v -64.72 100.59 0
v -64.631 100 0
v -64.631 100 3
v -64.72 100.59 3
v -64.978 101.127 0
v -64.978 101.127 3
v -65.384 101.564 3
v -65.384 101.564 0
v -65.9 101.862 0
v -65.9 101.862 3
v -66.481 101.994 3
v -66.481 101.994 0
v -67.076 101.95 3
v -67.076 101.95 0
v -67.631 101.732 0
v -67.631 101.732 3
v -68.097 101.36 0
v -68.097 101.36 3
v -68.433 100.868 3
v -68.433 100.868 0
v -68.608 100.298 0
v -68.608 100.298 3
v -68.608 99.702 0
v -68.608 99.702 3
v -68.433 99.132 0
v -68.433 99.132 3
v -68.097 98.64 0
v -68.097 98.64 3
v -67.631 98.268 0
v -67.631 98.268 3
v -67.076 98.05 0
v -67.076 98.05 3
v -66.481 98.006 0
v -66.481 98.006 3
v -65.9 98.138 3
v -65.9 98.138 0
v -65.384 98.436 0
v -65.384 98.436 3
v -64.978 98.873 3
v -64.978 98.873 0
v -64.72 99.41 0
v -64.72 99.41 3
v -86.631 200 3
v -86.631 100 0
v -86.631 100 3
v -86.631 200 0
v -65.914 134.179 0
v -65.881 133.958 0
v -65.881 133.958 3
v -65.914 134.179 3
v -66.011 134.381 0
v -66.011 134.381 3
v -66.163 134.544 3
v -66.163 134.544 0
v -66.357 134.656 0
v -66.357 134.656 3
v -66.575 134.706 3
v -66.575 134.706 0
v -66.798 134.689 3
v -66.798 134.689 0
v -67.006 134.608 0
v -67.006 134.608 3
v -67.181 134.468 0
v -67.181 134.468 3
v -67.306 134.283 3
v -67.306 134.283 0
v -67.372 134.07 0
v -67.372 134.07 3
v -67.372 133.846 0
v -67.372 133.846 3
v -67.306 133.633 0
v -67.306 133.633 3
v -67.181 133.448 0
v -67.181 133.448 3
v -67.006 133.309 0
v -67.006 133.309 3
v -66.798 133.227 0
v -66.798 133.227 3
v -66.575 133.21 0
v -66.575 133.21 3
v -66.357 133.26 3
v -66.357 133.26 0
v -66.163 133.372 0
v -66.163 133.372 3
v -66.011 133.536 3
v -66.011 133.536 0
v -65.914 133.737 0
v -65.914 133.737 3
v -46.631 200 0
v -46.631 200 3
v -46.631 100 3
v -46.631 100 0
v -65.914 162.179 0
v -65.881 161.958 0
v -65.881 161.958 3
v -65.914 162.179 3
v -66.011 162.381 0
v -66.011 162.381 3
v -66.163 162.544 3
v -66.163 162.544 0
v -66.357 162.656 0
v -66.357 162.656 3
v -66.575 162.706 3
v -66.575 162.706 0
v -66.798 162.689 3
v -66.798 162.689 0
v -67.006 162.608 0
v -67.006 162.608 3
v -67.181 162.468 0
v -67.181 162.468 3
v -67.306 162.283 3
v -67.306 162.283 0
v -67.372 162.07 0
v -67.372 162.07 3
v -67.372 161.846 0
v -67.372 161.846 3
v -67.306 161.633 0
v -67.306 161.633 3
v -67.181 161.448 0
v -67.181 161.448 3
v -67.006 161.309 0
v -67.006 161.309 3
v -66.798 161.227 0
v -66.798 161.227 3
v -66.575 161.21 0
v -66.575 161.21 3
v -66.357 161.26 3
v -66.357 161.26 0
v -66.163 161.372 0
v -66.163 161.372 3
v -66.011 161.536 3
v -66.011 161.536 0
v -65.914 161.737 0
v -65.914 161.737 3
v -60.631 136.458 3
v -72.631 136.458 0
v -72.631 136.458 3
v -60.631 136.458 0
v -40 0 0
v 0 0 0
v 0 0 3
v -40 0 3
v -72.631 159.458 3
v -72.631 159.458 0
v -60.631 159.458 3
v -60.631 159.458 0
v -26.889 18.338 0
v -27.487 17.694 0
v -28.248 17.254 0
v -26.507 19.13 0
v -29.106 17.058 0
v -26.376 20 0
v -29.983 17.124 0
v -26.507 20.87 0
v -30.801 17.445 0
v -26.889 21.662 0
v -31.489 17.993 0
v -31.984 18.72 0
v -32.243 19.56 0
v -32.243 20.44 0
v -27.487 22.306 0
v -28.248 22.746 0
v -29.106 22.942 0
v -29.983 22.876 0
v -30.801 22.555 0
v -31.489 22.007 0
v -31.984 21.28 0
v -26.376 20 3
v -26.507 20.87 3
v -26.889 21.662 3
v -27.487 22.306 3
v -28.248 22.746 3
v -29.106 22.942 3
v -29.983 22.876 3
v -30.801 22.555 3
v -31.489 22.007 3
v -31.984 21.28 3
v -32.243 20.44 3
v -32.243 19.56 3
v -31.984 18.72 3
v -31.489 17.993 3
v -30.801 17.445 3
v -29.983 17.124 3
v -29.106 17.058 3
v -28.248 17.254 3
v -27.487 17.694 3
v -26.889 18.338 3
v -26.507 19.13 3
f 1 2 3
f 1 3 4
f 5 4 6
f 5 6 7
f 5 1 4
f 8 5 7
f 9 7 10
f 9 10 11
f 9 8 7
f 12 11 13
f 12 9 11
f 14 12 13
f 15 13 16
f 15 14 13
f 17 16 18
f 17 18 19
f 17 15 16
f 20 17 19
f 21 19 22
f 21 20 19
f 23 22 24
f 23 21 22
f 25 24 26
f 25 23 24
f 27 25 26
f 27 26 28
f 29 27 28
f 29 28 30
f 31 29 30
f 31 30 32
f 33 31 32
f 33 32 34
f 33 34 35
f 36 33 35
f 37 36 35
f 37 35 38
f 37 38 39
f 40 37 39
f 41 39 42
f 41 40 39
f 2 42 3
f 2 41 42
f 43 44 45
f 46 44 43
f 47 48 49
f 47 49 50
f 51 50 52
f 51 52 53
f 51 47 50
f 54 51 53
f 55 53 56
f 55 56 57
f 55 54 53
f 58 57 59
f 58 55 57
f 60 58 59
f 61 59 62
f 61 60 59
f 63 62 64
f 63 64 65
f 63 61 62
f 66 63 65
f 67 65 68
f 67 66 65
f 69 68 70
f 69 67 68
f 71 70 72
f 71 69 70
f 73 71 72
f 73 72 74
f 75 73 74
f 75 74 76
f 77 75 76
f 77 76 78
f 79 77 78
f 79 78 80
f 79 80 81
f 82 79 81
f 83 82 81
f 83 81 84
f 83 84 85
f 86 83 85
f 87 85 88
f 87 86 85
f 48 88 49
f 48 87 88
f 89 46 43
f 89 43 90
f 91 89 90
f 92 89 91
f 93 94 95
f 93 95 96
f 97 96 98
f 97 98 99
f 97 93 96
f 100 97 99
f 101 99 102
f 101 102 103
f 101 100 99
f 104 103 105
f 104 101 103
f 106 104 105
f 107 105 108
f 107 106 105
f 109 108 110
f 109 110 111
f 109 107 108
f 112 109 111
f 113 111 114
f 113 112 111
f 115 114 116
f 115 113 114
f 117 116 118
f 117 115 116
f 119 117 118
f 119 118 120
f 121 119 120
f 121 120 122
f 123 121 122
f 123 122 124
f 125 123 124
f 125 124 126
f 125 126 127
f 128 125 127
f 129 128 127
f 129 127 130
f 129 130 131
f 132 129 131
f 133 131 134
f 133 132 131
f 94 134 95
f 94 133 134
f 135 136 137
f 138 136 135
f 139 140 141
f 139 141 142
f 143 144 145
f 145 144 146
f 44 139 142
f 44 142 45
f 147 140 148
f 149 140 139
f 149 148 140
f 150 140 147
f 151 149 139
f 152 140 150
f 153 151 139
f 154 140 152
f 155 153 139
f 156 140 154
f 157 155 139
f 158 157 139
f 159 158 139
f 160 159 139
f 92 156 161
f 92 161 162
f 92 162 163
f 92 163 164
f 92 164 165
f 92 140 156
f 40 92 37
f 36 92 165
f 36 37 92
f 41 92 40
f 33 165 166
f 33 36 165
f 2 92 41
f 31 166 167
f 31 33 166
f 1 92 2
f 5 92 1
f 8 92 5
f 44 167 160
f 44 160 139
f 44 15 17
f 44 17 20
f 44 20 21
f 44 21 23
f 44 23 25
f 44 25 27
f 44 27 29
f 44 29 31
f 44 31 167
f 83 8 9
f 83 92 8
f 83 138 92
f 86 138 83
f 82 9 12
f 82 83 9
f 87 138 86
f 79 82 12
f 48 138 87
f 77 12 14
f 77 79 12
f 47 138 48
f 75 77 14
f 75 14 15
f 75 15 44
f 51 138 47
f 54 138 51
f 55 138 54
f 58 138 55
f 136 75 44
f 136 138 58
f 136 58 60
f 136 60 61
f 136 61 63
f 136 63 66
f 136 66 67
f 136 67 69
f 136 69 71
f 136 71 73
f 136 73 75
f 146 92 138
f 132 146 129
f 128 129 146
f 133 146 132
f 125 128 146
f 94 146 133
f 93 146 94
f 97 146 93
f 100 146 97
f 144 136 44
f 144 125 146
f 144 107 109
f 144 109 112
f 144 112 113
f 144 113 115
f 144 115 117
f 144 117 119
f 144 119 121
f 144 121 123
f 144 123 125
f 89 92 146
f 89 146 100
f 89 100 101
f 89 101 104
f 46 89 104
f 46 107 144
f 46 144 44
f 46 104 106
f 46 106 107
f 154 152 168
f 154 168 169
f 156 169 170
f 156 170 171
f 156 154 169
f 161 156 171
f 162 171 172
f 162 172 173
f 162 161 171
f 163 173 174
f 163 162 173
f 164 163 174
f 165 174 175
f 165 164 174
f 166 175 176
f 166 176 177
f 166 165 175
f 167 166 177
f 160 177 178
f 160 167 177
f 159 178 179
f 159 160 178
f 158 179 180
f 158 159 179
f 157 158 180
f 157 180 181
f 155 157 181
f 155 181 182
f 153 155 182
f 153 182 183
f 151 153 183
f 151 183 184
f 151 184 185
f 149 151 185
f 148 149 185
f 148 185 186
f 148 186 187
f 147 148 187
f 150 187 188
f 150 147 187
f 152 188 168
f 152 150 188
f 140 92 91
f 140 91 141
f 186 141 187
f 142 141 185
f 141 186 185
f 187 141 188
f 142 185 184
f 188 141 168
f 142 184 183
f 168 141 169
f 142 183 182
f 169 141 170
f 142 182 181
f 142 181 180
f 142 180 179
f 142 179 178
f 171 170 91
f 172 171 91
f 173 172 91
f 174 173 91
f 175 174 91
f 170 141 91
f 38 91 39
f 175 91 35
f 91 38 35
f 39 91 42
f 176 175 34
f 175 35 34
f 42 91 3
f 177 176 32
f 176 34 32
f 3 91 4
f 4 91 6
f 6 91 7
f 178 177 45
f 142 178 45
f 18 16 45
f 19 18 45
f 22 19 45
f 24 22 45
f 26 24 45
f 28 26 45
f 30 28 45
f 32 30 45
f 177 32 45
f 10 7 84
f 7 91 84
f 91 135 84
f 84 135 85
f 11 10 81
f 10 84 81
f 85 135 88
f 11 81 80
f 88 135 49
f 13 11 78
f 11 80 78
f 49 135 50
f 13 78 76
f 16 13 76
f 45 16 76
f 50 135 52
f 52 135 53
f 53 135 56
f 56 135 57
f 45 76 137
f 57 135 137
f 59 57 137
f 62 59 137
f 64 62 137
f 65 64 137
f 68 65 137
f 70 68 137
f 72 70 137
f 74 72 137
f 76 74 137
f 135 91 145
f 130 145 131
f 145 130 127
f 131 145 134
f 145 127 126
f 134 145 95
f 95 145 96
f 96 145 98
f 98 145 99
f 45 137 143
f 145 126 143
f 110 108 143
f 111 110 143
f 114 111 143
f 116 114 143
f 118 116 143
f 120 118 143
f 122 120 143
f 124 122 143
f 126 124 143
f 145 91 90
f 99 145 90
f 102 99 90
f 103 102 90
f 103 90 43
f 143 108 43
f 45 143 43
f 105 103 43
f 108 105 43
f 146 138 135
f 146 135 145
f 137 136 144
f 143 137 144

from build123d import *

# Parameters (mm, degrees)
CROQUIS1_R              = 2.95
CROQUIS1_R_2            = 0.75
CROQUIS1_R_3            = 2
CROQUIS1_W              = 12
CROQUIS1_H              = 23
SALIENTE_EXTRUIR1_DEPTH = 3


with BuildPart() as part:
    # Croquis1 → Saliente-Extruir1 (new body)
    with BuildSketch(Plane.XY):
        Polygon((0, 0), (-40, 0), (-86.630765816, 100), (-86.630765816, 200), (-46.630765816, 200), (-46.630765816, 100), align=None)
        with Locations((-29.326153163, 20)):
            Circle(CROQUIS1_R, mode=Mode.SUBTRACT)
        with Locations((-66.630765816, 133.95806763)):
            Circle(CROQUIS1_R_2, mode=Mode.SUBTRACT)
        with Locations((-66.630765816, 161.95806763)):
            Circle(CROQUIS1_R_2, mode=Mode.SUBTRACT)
        with Locations((-66.630765816, 100)):
            Circle(CROQUIS1_R_3, mode=Mode.SUBTRACT)
        with Locations((-66.630765816, 147.95806763)):
            Rectangle(CROQUIS1_W, CROQUIS1_H, mode=Mode.SUBTRACT)
    extrude(amount=SALIENTE_EXTRUIR1_DEPTH)


solid = part.part
